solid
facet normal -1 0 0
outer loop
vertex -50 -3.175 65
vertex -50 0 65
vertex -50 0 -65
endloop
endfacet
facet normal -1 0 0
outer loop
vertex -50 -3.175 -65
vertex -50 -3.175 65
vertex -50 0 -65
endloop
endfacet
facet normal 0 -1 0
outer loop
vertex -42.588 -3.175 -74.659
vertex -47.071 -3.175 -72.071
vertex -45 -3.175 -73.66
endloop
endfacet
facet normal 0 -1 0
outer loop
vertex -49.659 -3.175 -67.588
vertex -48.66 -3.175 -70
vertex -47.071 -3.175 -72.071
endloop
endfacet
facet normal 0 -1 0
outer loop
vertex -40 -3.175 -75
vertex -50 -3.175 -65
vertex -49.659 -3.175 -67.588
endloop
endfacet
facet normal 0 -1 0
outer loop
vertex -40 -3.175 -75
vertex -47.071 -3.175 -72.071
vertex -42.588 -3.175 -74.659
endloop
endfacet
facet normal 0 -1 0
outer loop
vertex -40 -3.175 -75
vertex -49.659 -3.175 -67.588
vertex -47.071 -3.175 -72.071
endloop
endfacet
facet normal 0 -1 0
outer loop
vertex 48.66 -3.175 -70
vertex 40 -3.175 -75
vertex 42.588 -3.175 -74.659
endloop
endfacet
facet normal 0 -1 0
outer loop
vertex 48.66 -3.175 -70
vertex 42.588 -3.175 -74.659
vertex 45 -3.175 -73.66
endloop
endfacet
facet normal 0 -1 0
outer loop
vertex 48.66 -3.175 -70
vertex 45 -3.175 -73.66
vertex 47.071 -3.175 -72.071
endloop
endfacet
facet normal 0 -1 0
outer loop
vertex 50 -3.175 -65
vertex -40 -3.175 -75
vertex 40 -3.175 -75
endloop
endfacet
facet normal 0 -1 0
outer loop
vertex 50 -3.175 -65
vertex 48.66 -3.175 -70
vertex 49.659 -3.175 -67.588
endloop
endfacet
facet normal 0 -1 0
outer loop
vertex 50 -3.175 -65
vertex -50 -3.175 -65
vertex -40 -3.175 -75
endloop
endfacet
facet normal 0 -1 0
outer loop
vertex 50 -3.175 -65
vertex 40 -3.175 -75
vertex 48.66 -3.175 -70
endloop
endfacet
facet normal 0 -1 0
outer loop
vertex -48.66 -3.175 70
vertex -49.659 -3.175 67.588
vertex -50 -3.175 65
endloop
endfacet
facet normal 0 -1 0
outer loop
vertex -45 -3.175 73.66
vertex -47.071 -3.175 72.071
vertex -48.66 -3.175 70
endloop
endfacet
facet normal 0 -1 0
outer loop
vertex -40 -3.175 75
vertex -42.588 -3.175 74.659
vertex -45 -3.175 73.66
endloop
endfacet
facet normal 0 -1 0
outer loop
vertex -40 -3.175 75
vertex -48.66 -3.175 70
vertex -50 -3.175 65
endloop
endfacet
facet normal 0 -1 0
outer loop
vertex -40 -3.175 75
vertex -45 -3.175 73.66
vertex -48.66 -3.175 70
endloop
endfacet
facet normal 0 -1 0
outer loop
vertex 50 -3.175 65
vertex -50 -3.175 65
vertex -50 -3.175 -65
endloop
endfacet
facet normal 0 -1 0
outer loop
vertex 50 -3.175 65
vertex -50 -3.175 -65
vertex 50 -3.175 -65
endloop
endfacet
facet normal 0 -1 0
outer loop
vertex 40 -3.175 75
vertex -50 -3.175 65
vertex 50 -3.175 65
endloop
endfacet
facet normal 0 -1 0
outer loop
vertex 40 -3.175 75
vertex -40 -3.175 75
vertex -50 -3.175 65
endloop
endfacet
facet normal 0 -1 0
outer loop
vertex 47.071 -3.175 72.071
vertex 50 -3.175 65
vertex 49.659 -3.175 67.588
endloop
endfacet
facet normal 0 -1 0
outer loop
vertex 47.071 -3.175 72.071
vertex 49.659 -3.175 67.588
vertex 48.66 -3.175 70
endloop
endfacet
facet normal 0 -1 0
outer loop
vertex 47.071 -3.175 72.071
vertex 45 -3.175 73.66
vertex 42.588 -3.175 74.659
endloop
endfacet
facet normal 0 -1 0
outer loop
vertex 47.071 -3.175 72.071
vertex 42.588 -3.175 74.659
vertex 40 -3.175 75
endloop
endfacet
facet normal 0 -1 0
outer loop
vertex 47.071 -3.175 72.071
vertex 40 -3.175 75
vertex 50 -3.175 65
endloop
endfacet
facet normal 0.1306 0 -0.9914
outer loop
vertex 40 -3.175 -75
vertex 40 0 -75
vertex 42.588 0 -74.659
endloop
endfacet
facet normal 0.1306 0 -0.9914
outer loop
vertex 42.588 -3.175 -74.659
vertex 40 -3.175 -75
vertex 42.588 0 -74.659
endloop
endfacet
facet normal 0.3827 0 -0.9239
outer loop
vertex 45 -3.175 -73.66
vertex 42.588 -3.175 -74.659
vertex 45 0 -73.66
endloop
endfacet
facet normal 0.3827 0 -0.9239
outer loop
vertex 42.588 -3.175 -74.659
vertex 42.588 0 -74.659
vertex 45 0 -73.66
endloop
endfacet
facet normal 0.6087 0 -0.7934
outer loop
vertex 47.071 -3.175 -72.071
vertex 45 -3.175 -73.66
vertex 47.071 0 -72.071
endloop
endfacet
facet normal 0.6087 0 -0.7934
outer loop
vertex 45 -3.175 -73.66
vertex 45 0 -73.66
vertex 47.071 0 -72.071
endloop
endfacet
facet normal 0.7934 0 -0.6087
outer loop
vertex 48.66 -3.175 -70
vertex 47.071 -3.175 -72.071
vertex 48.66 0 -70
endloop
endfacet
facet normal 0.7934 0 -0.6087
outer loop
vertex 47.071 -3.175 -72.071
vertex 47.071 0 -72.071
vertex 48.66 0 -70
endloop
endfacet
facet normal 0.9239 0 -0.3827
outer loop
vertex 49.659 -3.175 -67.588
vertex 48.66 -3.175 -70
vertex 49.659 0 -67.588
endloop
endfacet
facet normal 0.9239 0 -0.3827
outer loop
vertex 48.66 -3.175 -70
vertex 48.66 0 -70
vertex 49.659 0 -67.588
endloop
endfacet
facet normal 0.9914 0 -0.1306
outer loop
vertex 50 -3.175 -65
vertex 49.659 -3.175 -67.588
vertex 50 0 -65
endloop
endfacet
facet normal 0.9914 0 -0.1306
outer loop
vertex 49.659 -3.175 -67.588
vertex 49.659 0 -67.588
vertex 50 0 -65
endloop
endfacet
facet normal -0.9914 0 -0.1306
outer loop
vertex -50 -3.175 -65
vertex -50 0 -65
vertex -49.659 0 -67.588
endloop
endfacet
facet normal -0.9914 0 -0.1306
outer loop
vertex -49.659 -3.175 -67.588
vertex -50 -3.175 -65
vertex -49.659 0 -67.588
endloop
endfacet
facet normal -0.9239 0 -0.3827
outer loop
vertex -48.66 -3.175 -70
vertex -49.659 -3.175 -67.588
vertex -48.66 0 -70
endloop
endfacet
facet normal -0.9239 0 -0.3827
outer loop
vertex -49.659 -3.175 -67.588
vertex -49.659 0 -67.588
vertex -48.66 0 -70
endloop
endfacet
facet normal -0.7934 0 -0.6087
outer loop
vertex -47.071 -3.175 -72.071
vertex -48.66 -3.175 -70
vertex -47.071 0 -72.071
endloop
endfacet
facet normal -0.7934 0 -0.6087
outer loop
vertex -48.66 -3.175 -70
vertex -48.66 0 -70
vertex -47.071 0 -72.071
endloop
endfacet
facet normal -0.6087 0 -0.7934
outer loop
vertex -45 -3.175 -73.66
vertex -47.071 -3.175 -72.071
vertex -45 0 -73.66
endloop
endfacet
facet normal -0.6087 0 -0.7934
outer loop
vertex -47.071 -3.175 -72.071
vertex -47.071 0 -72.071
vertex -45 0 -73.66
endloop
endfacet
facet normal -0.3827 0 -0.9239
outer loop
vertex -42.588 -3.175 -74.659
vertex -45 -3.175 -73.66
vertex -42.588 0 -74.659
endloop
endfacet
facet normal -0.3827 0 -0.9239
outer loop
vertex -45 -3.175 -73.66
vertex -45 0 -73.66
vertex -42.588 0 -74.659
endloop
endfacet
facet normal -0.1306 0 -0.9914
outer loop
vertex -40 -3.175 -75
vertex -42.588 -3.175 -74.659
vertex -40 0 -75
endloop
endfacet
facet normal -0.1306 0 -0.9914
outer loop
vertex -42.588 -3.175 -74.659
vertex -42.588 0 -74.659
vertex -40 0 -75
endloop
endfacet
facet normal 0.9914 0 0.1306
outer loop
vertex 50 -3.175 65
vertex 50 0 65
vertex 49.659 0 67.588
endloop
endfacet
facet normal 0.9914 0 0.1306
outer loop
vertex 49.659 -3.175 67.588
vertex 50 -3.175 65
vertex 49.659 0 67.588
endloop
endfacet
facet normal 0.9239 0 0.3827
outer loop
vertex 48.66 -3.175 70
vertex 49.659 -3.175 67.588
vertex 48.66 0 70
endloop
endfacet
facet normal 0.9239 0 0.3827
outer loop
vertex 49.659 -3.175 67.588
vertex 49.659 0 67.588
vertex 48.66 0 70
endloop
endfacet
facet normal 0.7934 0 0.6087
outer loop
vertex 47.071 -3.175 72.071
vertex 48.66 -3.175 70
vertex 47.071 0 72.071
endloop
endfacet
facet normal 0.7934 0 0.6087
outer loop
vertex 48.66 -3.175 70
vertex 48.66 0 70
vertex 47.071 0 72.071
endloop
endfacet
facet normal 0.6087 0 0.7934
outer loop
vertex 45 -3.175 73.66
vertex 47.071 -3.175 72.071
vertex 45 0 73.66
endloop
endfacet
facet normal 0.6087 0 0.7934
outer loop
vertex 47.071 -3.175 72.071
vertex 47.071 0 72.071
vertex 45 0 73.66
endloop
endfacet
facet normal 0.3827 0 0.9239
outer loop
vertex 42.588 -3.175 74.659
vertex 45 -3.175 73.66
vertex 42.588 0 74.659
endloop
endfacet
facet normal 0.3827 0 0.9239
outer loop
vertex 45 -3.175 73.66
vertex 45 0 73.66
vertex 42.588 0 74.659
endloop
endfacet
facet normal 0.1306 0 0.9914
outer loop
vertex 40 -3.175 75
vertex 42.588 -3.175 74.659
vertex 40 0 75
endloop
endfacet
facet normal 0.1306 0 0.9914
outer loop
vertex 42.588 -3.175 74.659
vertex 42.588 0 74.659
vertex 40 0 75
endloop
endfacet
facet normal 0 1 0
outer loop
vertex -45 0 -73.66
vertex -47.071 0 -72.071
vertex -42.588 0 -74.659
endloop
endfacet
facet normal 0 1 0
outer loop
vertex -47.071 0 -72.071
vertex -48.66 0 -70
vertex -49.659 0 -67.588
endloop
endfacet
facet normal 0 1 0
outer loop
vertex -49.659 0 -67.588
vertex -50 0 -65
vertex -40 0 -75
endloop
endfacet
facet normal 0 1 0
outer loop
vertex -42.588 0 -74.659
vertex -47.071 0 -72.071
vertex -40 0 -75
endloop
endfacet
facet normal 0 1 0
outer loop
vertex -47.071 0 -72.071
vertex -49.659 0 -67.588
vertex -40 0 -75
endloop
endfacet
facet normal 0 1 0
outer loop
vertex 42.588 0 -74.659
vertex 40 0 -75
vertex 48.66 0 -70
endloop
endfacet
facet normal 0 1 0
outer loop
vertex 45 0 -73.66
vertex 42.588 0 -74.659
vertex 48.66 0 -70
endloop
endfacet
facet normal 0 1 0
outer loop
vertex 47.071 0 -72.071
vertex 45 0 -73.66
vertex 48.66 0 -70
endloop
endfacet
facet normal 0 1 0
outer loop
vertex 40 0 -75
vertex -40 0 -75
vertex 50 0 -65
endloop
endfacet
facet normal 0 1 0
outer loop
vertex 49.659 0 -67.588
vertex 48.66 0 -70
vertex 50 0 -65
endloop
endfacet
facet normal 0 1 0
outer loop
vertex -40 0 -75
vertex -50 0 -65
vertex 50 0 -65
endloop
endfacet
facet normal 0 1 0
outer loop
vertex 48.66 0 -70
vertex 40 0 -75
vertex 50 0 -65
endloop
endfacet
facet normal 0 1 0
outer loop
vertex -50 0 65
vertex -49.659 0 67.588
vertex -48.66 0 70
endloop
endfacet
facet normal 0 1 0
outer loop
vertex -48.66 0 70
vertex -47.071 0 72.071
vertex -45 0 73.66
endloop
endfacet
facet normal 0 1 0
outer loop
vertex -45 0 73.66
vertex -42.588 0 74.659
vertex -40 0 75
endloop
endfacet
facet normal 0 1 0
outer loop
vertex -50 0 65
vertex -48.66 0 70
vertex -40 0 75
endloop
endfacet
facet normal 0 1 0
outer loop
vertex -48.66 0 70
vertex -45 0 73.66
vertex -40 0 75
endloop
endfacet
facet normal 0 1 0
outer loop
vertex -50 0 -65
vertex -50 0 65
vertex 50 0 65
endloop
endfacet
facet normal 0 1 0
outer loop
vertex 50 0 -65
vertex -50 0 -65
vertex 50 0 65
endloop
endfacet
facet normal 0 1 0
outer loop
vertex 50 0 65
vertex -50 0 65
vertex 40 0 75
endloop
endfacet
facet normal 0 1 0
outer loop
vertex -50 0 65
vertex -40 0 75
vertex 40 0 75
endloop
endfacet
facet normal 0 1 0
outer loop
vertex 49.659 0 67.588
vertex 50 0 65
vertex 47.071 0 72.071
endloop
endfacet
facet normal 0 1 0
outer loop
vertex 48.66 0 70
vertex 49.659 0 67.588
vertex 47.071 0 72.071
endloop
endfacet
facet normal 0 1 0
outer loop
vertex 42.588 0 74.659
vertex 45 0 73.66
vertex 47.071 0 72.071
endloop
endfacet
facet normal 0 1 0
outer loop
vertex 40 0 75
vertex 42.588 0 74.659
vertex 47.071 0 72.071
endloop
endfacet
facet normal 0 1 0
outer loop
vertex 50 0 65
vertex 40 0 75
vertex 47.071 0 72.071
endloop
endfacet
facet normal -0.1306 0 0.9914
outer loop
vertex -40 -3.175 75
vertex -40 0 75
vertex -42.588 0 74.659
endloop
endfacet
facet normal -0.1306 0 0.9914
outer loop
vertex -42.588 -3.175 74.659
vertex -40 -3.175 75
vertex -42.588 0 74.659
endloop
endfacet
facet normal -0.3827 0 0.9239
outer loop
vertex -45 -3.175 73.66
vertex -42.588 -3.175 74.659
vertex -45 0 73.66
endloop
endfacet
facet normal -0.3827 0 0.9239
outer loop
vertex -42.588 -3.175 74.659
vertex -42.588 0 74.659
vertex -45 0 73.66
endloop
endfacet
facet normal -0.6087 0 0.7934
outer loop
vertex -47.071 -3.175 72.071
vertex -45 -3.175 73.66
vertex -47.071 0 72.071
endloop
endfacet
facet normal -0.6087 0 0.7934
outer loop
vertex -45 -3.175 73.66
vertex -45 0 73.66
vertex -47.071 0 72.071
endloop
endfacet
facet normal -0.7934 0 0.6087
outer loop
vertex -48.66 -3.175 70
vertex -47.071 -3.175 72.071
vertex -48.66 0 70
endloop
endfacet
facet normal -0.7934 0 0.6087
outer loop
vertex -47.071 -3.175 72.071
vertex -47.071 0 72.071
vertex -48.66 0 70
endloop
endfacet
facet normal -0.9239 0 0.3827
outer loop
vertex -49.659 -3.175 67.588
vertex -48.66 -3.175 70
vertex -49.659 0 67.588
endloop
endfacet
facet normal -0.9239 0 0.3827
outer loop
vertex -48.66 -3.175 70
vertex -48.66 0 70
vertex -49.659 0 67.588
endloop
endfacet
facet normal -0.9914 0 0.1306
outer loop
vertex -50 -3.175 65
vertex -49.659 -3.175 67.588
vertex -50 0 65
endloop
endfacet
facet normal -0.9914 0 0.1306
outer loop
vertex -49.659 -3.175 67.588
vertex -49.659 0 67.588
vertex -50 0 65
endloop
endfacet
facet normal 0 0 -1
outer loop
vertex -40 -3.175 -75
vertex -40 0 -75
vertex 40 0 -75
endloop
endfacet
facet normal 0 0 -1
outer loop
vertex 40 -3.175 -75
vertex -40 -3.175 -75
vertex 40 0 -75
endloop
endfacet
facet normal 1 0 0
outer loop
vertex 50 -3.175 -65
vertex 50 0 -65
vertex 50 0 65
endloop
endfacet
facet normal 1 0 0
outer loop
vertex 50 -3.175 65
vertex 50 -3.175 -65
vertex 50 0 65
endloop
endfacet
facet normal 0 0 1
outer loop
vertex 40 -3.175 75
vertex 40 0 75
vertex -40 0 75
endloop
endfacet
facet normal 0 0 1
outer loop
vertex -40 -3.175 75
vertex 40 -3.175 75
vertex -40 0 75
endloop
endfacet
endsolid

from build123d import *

# Parameters (mm, degrees)
F0_W     = 50
F0_H     = 50
F1_DEPTH = 3.175


with BuildPart() as f1:
    # F0 (on Front) → F1 (new body)
    with BuildSketch(Plane.XZ):
        with BuildLine():
            Line((40, 75), (-40, 75))
            ThreePointArc((-40, 75), (-47.071068, 72.071068), (-50, 65))
            Line((-50, 65), (-50, -65))
            ThreePointArc((-50, -65), (-47.071068, -72.071068), (-40, -75))
            Line((-40, -75), (40, -75))
            ThreePointArc((40, -75), (47.071068, -72.071068), (50, -65))
            Line((50, -65), (50, 65))
            ThreePointArc((50, 65), (47.071068, 72.071068), (40, 75))
        make_face()
        Rectangle(F0_W, F0_H, mode=Mode.SUBTRACT)
        Rectangle(F0_W, F0_H)
    extrude(amount=F1_DEPTH)


solid = f1.part
